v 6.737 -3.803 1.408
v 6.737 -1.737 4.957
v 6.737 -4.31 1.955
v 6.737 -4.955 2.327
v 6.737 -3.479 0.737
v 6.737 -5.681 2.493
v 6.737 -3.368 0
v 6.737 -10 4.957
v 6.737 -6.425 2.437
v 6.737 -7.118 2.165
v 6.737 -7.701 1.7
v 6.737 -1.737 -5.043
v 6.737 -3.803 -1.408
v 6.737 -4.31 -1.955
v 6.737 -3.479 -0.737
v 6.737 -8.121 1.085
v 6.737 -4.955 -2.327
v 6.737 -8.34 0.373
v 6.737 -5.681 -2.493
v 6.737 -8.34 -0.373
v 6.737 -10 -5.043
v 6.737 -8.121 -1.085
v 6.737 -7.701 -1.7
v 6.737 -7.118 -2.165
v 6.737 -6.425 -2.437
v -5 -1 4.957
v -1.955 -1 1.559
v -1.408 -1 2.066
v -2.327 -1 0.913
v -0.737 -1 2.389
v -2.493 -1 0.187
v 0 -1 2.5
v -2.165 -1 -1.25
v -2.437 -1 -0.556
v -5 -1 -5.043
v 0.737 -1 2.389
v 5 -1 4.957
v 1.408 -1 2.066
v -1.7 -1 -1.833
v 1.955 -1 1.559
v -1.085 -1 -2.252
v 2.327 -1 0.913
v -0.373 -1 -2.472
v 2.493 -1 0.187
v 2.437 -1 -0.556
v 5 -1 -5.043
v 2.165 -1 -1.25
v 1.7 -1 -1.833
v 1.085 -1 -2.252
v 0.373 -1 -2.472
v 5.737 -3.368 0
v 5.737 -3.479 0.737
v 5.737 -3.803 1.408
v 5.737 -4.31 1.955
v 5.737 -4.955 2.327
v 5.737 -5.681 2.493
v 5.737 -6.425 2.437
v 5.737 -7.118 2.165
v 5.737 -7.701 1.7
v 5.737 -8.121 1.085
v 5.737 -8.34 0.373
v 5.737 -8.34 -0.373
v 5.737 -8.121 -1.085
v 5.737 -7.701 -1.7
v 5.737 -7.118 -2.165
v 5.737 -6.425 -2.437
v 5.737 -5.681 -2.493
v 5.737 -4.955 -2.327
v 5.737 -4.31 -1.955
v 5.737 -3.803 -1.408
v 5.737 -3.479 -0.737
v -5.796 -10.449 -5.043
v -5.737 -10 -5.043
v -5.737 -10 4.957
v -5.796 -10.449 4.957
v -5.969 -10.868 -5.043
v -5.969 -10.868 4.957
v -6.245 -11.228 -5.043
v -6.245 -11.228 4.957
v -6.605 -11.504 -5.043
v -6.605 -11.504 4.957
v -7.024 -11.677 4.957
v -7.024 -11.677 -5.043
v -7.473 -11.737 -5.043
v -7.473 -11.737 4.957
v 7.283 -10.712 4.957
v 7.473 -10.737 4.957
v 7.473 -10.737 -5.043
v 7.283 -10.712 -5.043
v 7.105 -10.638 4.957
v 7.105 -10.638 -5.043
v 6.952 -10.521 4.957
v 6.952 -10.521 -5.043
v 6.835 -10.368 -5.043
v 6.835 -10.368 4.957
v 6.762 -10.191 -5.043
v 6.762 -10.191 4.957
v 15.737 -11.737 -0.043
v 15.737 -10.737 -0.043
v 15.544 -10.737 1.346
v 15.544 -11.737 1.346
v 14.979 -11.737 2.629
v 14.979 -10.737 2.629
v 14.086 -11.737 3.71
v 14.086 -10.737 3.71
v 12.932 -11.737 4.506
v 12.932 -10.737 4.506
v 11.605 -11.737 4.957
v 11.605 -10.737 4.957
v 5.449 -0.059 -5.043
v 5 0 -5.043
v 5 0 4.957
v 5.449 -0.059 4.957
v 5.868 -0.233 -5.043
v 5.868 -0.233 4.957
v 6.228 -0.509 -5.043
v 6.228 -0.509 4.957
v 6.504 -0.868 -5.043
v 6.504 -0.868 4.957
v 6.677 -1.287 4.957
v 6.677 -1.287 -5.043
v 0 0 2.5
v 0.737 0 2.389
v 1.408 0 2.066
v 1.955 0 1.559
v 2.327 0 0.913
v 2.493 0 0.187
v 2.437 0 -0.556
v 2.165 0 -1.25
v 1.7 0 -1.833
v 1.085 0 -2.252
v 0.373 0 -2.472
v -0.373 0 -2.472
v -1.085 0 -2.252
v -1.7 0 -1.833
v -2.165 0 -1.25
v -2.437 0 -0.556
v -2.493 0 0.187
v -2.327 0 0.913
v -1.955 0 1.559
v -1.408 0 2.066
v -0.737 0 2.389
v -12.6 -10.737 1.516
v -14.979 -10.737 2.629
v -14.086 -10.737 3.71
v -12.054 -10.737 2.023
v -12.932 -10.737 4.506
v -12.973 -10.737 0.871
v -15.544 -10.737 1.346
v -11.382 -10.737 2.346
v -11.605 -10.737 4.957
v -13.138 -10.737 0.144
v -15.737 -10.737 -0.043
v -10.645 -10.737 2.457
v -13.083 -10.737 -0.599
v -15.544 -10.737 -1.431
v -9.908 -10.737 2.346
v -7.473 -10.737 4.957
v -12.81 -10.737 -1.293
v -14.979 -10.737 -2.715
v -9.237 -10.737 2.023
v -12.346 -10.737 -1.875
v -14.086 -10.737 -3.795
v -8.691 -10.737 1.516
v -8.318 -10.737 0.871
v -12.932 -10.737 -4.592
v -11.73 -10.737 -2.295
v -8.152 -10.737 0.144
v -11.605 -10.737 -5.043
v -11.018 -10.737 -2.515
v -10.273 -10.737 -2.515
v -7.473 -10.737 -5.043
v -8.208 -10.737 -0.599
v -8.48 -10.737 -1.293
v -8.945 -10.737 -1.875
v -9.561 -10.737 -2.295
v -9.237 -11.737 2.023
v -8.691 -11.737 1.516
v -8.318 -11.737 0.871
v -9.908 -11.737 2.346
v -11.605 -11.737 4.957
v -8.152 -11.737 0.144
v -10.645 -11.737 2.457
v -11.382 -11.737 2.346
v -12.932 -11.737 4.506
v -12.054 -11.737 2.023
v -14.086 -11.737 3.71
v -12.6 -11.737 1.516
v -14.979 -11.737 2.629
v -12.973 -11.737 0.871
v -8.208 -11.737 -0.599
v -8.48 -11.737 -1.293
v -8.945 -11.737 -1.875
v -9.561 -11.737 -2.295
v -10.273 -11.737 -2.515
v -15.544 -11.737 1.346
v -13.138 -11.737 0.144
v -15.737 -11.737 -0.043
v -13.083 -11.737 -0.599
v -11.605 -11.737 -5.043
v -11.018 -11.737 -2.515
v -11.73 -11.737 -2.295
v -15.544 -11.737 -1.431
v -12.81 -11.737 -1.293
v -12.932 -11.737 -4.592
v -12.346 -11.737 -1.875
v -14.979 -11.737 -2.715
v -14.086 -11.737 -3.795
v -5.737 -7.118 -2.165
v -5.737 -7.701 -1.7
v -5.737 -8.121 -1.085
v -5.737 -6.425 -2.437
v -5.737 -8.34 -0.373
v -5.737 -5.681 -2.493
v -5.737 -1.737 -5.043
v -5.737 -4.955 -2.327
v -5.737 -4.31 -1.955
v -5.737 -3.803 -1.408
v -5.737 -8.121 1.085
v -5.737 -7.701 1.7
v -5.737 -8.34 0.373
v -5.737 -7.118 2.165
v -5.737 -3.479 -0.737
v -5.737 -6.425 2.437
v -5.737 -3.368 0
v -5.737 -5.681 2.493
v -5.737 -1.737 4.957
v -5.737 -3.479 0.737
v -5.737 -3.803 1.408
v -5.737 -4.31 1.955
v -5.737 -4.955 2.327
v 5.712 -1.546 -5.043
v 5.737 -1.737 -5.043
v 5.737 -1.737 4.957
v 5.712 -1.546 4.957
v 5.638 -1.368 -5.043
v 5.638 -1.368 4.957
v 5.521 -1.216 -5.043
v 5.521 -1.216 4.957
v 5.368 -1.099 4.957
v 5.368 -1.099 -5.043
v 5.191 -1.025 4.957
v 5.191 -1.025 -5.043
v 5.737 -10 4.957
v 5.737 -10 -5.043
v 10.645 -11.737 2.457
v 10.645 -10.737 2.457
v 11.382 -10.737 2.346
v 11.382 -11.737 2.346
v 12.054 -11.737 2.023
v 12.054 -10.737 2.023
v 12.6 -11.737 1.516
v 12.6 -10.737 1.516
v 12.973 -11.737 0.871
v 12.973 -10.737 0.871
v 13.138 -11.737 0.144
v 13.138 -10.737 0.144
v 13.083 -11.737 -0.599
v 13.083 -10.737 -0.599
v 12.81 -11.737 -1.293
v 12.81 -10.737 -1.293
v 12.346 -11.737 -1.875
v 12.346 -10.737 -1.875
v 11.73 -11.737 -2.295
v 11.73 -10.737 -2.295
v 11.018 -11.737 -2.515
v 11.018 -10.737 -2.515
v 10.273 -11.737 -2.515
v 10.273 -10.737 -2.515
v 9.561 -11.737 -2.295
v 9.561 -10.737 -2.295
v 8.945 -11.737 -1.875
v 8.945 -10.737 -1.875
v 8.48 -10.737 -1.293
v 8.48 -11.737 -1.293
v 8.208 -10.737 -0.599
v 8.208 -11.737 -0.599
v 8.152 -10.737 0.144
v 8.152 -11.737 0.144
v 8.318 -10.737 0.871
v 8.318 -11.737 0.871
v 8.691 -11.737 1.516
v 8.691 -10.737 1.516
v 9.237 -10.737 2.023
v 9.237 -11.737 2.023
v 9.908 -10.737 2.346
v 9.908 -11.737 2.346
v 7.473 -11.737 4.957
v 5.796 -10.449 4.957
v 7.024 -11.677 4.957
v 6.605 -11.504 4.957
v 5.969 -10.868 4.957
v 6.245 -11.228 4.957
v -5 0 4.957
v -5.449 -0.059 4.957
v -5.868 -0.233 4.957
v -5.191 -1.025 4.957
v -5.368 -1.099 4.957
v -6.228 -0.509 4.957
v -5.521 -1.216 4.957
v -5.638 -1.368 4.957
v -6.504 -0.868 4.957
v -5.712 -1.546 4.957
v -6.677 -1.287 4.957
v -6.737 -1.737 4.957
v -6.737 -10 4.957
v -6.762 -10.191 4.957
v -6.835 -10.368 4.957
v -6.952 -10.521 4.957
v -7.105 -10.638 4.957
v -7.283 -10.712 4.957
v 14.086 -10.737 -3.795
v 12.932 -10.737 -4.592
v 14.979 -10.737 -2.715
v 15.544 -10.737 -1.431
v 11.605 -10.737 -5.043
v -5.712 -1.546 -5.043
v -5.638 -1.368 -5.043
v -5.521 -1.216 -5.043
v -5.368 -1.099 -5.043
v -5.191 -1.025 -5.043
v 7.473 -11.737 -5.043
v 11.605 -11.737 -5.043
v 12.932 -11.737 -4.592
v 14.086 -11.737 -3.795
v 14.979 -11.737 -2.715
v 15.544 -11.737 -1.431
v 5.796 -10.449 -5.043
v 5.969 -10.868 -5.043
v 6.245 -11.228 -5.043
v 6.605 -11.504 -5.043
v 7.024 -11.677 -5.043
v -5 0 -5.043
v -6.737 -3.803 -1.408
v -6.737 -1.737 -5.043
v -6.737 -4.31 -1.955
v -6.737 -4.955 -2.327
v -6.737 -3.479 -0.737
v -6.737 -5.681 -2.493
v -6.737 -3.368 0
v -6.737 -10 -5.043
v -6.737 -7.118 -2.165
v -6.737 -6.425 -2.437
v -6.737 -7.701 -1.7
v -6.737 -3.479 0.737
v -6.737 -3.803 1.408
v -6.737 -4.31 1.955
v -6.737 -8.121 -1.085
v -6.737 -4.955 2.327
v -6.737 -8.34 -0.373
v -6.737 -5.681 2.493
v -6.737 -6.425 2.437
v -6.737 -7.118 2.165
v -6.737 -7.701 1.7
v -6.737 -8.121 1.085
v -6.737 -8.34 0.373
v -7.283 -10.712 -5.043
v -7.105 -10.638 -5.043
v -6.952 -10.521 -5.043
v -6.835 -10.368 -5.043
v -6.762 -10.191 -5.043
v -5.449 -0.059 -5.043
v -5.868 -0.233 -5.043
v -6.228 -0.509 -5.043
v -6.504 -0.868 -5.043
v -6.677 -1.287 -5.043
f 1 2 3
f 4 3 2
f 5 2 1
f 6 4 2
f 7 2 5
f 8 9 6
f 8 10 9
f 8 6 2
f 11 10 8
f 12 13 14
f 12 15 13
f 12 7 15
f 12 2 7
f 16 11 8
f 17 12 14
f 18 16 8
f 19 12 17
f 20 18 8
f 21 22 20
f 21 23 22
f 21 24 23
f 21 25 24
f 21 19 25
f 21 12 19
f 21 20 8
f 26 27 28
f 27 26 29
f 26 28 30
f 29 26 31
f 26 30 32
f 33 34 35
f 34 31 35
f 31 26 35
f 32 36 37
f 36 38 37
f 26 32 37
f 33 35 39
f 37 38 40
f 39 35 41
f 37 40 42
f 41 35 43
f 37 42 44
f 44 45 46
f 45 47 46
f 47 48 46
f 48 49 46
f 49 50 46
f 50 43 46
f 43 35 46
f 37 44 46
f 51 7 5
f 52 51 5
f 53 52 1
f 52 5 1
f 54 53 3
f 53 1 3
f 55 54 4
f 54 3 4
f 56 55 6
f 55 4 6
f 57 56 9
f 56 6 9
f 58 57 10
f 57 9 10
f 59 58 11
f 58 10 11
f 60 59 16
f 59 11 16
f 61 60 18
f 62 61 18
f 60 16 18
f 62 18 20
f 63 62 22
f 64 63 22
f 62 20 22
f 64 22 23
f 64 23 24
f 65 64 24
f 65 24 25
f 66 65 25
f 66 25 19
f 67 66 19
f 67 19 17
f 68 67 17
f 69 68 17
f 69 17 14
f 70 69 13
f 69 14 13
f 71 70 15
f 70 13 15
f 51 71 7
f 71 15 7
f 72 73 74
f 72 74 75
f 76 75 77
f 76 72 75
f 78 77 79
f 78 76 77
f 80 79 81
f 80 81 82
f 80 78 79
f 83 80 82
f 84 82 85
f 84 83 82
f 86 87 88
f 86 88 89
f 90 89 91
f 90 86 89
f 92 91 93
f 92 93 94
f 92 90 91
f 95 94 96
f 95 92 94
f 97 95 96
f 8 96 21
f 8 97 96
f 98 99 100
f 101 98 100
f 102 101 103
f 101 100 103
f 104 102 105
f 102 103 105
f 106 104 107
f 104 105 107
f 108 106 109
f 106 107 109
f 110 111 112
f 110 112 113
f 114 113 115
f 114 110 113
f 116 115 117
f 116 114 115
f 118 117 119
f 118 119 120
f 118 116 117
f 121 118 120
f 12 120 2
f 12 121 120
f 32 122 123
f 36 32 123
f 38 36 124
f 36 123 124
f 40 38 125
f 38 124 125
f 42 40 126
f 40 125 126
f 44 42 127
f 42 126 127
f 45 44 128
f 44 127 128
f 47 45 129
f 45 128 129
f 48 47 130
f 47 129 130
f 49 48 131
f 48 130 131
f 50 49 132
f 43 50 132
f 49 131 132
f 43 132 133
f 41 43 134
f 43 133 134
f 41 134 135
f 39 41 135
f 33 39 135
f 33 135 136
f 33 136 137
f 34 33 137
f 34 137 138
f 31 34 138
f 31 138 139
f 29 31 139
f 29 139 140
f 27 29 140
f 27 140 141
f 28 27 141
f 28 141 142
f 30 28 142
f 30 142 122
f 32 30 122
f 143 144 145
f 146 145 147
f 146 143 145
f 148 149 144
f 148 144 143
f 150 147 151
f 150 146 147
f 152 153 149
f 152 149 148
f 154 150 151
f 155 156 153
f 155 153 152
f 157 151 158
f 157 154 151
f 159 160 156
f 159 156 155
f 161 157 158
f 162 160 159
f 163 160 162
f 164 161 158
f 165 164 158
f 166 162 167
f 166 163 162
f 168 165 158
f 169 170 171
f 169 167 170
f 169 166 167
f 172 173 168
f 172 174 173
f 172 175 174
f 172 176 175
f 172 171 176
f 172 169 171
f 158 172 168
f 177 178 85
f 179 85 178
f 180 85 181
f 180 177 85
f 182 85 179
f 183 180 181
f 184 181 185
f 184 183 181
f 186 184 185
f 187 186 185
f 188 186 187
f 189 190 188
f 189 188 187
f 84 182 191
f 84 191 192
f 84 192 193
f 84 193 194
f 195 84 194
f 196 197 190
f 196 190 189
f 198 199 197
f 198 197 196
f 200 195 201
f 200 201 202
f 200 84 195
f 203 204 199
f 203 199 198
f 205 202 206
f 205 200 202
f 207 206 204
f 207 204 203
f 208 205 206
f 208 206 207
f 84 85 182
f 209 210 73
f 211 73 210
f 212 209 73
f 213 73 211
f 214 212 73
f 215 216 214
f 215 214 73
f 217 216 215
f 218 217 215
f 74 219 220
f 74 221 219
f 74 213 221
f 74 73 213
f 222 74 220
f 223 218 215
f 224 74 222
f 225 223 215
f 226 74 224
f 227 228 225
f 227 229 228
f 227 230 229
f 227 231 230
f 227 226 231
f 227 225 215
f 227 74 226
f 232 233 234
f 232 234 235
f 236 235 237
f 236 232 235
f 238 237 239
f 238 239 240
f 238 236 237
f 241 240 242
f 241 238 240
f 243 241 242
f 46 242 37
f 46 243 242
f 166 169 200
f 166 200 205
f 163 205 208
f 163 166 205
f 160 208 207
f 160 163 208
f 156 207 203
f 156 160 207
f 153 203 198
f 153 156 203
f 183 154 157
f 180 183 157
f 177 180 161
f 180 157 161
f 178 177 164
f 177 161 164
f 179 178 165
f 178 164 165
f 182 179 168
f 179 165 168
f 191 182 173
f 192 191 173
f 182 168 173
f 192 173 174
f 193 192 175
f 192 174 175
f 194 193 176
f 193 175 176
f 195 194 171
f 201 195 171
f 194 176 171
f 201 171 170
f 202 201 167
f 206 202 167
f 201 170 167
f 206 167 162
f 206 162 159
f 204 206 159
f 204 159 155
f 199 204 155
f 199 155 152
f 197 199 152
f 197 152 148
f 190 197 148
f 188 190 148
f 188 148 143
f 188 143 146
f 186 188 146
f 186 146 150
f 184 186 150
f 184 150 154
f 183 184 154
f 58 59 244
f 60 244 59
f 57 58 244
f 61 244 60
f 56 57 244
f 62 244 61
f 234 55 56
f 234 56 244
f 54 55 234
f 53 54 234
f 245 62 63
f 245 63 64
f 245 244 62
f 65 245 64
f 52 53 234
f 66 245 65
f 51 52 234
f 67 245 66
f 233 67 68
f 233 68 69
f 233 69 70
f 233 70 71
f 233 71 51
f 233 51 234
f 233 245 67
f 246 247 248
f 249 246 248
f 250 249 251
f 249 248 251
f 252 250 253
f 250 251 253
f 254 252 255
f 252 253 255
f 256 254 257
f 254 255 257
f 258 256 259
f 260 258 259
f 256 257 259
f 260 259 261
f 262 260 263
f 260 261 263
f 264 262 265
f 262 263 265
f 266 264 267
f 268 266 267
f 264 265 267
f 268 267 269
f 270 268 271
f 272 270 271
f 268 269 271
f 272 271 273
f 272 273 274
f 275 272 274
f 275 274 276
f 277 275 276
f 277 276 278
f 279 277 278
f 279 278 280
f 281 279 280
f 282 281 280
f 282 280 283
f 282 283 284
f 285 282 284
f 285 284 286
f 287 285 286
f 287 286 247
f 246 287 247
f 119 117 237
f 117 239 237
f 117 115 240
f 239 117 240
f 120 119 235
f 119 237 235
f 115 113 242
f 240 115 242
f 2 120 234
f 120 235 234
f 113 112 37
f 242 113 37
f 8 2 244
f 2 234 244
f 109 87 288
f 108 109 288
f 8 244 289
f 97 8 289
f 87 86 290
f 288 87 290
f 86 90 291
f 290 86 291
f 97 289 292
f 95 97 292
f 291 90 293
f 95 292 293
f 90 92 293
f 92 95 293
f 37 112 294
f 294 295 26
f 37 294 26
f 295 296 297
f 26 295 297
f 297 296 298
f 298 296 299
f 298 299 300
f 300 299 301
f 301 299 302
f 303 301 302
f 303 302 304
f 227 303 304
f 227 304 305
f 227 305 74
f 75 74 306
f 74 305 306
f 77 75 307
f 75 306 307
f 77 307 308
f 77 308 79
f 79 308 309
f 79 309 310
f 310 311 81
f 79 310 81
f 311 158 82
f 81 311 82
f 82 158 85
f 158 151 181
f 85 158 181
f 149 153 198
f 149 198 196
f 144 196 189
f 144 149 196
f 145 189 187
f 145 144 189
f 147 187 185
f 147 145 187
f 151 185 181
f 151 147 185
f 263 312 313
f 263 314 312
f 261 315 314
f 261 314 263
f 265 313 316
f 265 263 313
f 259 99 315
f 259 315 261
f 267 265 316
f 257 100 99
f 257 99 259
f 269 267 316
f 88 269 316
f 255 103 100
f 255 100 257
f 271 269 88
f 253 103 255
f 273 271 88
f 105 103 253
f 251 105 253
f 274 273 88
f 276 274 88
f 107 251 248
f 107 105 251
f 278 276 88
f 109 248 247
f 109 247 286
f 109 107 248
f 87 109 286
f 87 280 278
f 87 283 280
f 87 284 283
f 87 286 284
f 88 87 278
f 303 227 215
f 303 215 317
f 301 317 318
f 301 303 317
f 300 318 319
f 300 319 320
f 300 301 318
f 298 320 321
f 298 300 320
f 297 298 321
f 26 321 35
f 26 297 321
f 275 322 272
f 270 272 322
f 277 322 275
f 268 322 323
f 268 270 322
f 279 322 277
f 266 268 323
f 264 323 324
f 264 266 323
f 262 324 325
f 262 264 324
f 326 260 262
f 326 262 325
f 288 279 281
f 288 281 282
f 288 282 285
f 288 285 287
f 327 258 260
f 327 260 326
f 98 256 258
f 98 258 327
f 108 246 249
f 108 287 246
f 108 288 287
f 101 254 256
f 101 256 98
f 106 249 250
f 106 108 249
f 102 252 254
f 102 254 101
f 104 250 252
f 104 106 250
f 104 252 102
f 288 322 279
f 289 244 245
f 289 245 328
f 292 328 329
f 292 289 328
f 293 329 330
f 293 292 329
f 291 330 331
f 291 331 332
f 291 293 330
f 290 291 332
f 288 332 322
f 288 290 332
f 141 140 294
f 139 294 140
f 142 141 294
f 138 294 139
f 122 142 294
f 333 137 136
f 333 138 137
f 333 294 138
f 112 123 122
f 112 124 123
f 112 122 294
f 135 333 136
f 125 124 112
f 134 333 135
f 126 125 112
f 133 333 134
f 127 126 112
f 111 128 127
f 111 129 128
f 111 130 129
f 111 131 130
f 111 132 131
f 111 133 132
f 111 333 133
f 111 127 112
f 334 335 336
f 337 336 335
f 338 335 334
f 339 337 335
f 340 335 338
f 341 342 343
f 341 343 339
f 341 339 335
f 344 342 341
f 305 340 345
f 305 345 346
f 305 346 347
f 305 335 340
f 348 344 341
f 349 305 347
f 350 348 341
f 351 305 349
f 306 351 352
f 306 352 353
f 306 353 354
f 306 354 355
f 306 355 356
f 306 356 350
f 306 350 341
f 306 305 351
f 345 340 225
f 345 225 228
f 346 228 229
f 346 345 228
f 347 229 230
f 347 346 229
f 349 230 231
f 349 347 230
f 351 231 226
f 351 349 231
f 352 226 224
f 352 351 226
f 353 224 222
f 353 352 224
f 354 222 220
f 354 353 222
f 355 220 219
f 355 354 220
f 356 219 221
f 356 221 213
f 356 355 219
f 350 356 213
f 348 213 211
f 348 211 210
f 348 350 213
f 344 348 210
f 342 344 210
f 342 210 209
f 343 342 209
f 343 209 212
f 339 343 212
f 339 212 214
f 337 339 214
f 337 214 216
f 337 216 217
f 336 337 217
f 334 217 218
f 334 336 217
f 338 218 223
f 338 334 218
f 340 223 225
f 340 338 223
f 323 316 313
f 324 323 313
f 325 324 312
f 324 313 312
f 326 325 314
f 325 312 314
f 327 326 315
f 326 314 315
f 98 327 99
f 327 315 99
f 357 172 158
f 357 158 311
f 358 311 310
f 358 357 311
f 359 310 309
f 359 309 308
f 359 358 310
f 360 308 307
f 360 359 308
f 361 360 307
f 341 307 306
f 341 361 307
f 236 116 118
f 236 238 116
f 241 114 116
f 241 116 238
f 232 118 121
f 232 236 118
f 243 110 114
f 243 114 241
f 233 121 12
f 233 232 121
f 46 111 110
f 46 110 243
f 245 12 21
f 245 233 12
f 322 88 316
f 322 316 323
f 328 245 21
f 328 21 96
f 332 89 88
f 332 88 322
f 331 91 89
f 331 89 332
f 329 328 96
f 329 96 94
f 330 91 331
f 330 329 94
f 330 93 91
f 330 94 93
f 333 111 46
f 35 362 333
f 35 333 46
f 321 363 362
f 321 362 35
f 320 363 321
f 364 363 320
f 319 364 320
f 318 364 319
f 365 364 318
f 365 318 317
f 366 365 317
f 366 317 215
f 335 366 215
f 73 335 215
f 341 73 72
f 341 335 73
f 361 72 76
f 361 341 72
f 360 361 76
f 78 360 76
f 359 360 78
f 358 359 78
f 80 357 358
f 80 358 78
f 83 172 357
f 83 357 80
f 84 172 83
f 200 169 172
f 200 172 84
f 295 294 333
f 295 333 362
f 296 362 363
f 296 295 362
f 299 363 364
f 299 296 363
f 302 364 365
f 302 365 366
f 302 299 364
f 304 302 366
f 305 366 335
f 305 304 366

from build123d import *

# Parameters (mm, degrees)
SKETCH1_W               = 10
SKETCH1_H               = 10
BASE_FLANGE1_DEPTH      = 1
EDGE_FLANGE2_DEPTH      = 10
EDGE_FLANGE2_BEND_DEPTH = 10
EDGE_FLANGE3_DEPTH      = 10
EDGE_FLANGE3_BEND_DEPTH = 10
CUT_EXTRUDE1_DEPTH      = 10
SKETCH25_R              = 2.5
CUT_EXTRUDE2_DEPTH      = 10
SKETCH26_R              = 2.5
CUT_EXTRUDE3_DEPTH      = 10
SKETCH27_R              = 2.5
CUT_EXTRUDE4_DEPTH      = 1


# Sheet-metal steps are written as plain solids
with BuildPart() as part:
    # Sketch1 → Base-Flange1 (new body)
    with BuildSketch(Plane(origin=(0, 0, 0), x_dir=(1, 0, 0), z_dir=(0, 1, 0))):
        with Locations((0, 0.042787107)):
            Rectangle(SKETCH1_W, SKETCH1_H)
    extrude(amount=-BASE_FLANGE1_DEPTH)

    # Edge-Flange2 section (across the edge) → Edge-Flange2 (add)
    with BuildSketch(Plane(origin=(5.7366, -1, -5.042787107), x_dir=(-1, 0, 0), z_dir=(0, 0, 1))):
        with BuildLine():
            Line((-1, 0.7366), (-1, 9))
            Line((-1, 9), (0, 9))
            Line((0, 9), (0, 0.7366))
            ThreePointArc((0, 0.7366), (0.215745145, 0.215745145), (0.7366, 0))
            Line((0.7366, 0), (0.7366, -1))
            ThreePointArc((0.7366, -1), (-0.491361636, -0.491361636), (-1, 0.7366))
        make_face()
    extrude(amount=EDGE_FLANGE2_DEPTH)

    # Edge-Flange2 section 2 (across the edge) → Edge-Flange2 bend (add)
    with BuildSketch(Plane(origin=(-5.7366, -1, 4.957212893), x_dir=(1, 0, 0), z_dir=(0, 0, -1))):
        with BuildLine():
            Line((-1, 0.7366), (-1, 9))
            Line((-1, 9), (0, 9))
            Line((0, 9), (0, 0.7366))
            ThreePointArc((0, 0.7366), (0.215745145, 0.215745145), (0.7366, 0))
            Line((0.7366, 0), (0.7366, -1))
            ThreePointArc((0.7366, -1), (-0.491361636, -0.491361636), (-1, 0.7366))
        make_face()
    extrude(amount=EDGE_FLANGE2_BEND_DEPTH)

    # Edge-Flange3 section (across the edge) → Edge-Flange3 (add)
    with BuildSketch(Plane(origin=(6.7366, -10.7366, 4.957212893), x_dir=(0, 1, 0), z_dir=(0, 0, -1))):
        with BuildLine():
            Line((-1, 0.7366), (-1, 9))
            Line((-1, 9), (0, 9))
            Line((0, 9), (0, 0.7366))
            ThreePointArc((0, 0.7366), (0.215745145, 0.215745145), (0.7366, 0))
            Line((0.7366, 0), (0.7366, -1))
            ThreePointArc((0.7366, -1), (-0.491361636, -0.491361636), (-1, 0.7366))
        make_face()
    extrude(amount=EDGE_FLANGE3_DEPTH)

    # Edge-Flange3 section 2 (across the edge) → Edge-Flange3 bend (add)
    with BuildSketch(Plane(origin=(-6.7366, -10.7366, -5.042787107), x_dir=(0, 1, 0), z_dir=(0, 0, 1))):
        with BuildLine():
            Line((-1, 0.7366), (-1, 9))
            Line((-1, 9), (0, 9))
            Line((0, 9), (0, 0.7366))
            ThreePointArc((0, 0.7366), (0.215745145, 0.215745145), (0.7366, 0))
            Line((0.7366, 0), (0.7366, -1))
            ThreePointArc((0.7366, -1), (-0.491361636, -0.491361636), (-1, 0.7366))
        make_face()
    extrude(amount=EDGE_FLANGE3_BEND_DEPTH)

    # Sketch24 → Cut-Extrude1 (cut)
    with BuildSketch(Plane(origin=(0, -10.7366, 0), x_dir=(1, 0, 0), z_dir=(0, 1, 0))):
        with BuildLine():
            Line((15.7366, -4.957212893), (15.7366, 0.042787107))
            ThreePointArc((15.7366, 0.042787107), (14.57002385, -3.200318846), (11.6049, -4.957212893))
            Line((11.6049, -4.957212893), (15.7366, -4.957212893))
        make_face()
        with BuildLine():
            Line((15.7366, 5.042787107), (11.6049, 5.042787107))
            ThreePointArc((11.6049, 5.042787107), (14.57002385, 3.28589306), (15.7366, 0.042787107))
            Line((15.7366, 0.042787107), (15.7366, 5.042787107))
        make_face()
    cut_extrude1 = extrude(amount=-CUT_EXTRUDE1_DEPTH, mode=Mode.SUBTRACT)

    # Mirror1: Cut-Extrude1 across plane
    add(cut_extrude1.mirror(Plane(origin=(0, 0, 0), x_dir=(0, 0, 1), z_dir=(1, 0, 0))), mode=Mode.SUBTRACT)

    # Sketch25 → Cut-Extrude2 (cut)
    with BuildSketch(Plane(origin=(0, 0, 0), x_dir=(1, 0, 0), z_dir=(0, 1, 0))):
        with Locations(Location((0, 0, 0), (0, 0, 270))):
            Circle(SKETCH25_R)
    extrude(amount=-CUT_EXTRUDE2_DEPTH, mode=Mode.SUBTRACT)

    # Sketch26 → Cut-Extrude3 (cut)
    with BuildSketch(Plane(origin=(0, -10.7366, 0), x_dir=(1, 0, 0), z_dir=(0, 1, 0))):
        with Locations(Location((10.645360935, 0.042787107, 0), (0, 0, 270))):
            Circle(SKETCH26_R)
        with Locations(Location((-10.645360935, 0.042787107, 0), (0, 0, 270))):
            Circle(SKETCH26_R)
    extrude(amount=-CUT_EXTRUDE3_DEPTH, mode=Mode.SUBTRACT)

    # Sketch27 → Cut-Extrude4 (cut)
    with BuildSketch(Plane(origin=(6.7366, 0, 0), x_dir=(0, 0, -1), z_dir=(1, 0, 0))):
        with Locations(Location((0, -5.8683, 0), (0, 0, 90))):
            Circle(SKETCH27_R)
    cut_extrude4 = extrude(amount=-CUT_EXTRUDE4_DEPTH, mode=Mode.SUBTRACT)

    # Mirror2: Cut-Extrude4 across plane
    add(cut_extrude4.mirror(Plane(origin=(0, 0, 0), x_dir=(0, 0, 1), z_dir=(1, 0, 0))), mode=Mode.SUBTRACT)


solid = part.part
